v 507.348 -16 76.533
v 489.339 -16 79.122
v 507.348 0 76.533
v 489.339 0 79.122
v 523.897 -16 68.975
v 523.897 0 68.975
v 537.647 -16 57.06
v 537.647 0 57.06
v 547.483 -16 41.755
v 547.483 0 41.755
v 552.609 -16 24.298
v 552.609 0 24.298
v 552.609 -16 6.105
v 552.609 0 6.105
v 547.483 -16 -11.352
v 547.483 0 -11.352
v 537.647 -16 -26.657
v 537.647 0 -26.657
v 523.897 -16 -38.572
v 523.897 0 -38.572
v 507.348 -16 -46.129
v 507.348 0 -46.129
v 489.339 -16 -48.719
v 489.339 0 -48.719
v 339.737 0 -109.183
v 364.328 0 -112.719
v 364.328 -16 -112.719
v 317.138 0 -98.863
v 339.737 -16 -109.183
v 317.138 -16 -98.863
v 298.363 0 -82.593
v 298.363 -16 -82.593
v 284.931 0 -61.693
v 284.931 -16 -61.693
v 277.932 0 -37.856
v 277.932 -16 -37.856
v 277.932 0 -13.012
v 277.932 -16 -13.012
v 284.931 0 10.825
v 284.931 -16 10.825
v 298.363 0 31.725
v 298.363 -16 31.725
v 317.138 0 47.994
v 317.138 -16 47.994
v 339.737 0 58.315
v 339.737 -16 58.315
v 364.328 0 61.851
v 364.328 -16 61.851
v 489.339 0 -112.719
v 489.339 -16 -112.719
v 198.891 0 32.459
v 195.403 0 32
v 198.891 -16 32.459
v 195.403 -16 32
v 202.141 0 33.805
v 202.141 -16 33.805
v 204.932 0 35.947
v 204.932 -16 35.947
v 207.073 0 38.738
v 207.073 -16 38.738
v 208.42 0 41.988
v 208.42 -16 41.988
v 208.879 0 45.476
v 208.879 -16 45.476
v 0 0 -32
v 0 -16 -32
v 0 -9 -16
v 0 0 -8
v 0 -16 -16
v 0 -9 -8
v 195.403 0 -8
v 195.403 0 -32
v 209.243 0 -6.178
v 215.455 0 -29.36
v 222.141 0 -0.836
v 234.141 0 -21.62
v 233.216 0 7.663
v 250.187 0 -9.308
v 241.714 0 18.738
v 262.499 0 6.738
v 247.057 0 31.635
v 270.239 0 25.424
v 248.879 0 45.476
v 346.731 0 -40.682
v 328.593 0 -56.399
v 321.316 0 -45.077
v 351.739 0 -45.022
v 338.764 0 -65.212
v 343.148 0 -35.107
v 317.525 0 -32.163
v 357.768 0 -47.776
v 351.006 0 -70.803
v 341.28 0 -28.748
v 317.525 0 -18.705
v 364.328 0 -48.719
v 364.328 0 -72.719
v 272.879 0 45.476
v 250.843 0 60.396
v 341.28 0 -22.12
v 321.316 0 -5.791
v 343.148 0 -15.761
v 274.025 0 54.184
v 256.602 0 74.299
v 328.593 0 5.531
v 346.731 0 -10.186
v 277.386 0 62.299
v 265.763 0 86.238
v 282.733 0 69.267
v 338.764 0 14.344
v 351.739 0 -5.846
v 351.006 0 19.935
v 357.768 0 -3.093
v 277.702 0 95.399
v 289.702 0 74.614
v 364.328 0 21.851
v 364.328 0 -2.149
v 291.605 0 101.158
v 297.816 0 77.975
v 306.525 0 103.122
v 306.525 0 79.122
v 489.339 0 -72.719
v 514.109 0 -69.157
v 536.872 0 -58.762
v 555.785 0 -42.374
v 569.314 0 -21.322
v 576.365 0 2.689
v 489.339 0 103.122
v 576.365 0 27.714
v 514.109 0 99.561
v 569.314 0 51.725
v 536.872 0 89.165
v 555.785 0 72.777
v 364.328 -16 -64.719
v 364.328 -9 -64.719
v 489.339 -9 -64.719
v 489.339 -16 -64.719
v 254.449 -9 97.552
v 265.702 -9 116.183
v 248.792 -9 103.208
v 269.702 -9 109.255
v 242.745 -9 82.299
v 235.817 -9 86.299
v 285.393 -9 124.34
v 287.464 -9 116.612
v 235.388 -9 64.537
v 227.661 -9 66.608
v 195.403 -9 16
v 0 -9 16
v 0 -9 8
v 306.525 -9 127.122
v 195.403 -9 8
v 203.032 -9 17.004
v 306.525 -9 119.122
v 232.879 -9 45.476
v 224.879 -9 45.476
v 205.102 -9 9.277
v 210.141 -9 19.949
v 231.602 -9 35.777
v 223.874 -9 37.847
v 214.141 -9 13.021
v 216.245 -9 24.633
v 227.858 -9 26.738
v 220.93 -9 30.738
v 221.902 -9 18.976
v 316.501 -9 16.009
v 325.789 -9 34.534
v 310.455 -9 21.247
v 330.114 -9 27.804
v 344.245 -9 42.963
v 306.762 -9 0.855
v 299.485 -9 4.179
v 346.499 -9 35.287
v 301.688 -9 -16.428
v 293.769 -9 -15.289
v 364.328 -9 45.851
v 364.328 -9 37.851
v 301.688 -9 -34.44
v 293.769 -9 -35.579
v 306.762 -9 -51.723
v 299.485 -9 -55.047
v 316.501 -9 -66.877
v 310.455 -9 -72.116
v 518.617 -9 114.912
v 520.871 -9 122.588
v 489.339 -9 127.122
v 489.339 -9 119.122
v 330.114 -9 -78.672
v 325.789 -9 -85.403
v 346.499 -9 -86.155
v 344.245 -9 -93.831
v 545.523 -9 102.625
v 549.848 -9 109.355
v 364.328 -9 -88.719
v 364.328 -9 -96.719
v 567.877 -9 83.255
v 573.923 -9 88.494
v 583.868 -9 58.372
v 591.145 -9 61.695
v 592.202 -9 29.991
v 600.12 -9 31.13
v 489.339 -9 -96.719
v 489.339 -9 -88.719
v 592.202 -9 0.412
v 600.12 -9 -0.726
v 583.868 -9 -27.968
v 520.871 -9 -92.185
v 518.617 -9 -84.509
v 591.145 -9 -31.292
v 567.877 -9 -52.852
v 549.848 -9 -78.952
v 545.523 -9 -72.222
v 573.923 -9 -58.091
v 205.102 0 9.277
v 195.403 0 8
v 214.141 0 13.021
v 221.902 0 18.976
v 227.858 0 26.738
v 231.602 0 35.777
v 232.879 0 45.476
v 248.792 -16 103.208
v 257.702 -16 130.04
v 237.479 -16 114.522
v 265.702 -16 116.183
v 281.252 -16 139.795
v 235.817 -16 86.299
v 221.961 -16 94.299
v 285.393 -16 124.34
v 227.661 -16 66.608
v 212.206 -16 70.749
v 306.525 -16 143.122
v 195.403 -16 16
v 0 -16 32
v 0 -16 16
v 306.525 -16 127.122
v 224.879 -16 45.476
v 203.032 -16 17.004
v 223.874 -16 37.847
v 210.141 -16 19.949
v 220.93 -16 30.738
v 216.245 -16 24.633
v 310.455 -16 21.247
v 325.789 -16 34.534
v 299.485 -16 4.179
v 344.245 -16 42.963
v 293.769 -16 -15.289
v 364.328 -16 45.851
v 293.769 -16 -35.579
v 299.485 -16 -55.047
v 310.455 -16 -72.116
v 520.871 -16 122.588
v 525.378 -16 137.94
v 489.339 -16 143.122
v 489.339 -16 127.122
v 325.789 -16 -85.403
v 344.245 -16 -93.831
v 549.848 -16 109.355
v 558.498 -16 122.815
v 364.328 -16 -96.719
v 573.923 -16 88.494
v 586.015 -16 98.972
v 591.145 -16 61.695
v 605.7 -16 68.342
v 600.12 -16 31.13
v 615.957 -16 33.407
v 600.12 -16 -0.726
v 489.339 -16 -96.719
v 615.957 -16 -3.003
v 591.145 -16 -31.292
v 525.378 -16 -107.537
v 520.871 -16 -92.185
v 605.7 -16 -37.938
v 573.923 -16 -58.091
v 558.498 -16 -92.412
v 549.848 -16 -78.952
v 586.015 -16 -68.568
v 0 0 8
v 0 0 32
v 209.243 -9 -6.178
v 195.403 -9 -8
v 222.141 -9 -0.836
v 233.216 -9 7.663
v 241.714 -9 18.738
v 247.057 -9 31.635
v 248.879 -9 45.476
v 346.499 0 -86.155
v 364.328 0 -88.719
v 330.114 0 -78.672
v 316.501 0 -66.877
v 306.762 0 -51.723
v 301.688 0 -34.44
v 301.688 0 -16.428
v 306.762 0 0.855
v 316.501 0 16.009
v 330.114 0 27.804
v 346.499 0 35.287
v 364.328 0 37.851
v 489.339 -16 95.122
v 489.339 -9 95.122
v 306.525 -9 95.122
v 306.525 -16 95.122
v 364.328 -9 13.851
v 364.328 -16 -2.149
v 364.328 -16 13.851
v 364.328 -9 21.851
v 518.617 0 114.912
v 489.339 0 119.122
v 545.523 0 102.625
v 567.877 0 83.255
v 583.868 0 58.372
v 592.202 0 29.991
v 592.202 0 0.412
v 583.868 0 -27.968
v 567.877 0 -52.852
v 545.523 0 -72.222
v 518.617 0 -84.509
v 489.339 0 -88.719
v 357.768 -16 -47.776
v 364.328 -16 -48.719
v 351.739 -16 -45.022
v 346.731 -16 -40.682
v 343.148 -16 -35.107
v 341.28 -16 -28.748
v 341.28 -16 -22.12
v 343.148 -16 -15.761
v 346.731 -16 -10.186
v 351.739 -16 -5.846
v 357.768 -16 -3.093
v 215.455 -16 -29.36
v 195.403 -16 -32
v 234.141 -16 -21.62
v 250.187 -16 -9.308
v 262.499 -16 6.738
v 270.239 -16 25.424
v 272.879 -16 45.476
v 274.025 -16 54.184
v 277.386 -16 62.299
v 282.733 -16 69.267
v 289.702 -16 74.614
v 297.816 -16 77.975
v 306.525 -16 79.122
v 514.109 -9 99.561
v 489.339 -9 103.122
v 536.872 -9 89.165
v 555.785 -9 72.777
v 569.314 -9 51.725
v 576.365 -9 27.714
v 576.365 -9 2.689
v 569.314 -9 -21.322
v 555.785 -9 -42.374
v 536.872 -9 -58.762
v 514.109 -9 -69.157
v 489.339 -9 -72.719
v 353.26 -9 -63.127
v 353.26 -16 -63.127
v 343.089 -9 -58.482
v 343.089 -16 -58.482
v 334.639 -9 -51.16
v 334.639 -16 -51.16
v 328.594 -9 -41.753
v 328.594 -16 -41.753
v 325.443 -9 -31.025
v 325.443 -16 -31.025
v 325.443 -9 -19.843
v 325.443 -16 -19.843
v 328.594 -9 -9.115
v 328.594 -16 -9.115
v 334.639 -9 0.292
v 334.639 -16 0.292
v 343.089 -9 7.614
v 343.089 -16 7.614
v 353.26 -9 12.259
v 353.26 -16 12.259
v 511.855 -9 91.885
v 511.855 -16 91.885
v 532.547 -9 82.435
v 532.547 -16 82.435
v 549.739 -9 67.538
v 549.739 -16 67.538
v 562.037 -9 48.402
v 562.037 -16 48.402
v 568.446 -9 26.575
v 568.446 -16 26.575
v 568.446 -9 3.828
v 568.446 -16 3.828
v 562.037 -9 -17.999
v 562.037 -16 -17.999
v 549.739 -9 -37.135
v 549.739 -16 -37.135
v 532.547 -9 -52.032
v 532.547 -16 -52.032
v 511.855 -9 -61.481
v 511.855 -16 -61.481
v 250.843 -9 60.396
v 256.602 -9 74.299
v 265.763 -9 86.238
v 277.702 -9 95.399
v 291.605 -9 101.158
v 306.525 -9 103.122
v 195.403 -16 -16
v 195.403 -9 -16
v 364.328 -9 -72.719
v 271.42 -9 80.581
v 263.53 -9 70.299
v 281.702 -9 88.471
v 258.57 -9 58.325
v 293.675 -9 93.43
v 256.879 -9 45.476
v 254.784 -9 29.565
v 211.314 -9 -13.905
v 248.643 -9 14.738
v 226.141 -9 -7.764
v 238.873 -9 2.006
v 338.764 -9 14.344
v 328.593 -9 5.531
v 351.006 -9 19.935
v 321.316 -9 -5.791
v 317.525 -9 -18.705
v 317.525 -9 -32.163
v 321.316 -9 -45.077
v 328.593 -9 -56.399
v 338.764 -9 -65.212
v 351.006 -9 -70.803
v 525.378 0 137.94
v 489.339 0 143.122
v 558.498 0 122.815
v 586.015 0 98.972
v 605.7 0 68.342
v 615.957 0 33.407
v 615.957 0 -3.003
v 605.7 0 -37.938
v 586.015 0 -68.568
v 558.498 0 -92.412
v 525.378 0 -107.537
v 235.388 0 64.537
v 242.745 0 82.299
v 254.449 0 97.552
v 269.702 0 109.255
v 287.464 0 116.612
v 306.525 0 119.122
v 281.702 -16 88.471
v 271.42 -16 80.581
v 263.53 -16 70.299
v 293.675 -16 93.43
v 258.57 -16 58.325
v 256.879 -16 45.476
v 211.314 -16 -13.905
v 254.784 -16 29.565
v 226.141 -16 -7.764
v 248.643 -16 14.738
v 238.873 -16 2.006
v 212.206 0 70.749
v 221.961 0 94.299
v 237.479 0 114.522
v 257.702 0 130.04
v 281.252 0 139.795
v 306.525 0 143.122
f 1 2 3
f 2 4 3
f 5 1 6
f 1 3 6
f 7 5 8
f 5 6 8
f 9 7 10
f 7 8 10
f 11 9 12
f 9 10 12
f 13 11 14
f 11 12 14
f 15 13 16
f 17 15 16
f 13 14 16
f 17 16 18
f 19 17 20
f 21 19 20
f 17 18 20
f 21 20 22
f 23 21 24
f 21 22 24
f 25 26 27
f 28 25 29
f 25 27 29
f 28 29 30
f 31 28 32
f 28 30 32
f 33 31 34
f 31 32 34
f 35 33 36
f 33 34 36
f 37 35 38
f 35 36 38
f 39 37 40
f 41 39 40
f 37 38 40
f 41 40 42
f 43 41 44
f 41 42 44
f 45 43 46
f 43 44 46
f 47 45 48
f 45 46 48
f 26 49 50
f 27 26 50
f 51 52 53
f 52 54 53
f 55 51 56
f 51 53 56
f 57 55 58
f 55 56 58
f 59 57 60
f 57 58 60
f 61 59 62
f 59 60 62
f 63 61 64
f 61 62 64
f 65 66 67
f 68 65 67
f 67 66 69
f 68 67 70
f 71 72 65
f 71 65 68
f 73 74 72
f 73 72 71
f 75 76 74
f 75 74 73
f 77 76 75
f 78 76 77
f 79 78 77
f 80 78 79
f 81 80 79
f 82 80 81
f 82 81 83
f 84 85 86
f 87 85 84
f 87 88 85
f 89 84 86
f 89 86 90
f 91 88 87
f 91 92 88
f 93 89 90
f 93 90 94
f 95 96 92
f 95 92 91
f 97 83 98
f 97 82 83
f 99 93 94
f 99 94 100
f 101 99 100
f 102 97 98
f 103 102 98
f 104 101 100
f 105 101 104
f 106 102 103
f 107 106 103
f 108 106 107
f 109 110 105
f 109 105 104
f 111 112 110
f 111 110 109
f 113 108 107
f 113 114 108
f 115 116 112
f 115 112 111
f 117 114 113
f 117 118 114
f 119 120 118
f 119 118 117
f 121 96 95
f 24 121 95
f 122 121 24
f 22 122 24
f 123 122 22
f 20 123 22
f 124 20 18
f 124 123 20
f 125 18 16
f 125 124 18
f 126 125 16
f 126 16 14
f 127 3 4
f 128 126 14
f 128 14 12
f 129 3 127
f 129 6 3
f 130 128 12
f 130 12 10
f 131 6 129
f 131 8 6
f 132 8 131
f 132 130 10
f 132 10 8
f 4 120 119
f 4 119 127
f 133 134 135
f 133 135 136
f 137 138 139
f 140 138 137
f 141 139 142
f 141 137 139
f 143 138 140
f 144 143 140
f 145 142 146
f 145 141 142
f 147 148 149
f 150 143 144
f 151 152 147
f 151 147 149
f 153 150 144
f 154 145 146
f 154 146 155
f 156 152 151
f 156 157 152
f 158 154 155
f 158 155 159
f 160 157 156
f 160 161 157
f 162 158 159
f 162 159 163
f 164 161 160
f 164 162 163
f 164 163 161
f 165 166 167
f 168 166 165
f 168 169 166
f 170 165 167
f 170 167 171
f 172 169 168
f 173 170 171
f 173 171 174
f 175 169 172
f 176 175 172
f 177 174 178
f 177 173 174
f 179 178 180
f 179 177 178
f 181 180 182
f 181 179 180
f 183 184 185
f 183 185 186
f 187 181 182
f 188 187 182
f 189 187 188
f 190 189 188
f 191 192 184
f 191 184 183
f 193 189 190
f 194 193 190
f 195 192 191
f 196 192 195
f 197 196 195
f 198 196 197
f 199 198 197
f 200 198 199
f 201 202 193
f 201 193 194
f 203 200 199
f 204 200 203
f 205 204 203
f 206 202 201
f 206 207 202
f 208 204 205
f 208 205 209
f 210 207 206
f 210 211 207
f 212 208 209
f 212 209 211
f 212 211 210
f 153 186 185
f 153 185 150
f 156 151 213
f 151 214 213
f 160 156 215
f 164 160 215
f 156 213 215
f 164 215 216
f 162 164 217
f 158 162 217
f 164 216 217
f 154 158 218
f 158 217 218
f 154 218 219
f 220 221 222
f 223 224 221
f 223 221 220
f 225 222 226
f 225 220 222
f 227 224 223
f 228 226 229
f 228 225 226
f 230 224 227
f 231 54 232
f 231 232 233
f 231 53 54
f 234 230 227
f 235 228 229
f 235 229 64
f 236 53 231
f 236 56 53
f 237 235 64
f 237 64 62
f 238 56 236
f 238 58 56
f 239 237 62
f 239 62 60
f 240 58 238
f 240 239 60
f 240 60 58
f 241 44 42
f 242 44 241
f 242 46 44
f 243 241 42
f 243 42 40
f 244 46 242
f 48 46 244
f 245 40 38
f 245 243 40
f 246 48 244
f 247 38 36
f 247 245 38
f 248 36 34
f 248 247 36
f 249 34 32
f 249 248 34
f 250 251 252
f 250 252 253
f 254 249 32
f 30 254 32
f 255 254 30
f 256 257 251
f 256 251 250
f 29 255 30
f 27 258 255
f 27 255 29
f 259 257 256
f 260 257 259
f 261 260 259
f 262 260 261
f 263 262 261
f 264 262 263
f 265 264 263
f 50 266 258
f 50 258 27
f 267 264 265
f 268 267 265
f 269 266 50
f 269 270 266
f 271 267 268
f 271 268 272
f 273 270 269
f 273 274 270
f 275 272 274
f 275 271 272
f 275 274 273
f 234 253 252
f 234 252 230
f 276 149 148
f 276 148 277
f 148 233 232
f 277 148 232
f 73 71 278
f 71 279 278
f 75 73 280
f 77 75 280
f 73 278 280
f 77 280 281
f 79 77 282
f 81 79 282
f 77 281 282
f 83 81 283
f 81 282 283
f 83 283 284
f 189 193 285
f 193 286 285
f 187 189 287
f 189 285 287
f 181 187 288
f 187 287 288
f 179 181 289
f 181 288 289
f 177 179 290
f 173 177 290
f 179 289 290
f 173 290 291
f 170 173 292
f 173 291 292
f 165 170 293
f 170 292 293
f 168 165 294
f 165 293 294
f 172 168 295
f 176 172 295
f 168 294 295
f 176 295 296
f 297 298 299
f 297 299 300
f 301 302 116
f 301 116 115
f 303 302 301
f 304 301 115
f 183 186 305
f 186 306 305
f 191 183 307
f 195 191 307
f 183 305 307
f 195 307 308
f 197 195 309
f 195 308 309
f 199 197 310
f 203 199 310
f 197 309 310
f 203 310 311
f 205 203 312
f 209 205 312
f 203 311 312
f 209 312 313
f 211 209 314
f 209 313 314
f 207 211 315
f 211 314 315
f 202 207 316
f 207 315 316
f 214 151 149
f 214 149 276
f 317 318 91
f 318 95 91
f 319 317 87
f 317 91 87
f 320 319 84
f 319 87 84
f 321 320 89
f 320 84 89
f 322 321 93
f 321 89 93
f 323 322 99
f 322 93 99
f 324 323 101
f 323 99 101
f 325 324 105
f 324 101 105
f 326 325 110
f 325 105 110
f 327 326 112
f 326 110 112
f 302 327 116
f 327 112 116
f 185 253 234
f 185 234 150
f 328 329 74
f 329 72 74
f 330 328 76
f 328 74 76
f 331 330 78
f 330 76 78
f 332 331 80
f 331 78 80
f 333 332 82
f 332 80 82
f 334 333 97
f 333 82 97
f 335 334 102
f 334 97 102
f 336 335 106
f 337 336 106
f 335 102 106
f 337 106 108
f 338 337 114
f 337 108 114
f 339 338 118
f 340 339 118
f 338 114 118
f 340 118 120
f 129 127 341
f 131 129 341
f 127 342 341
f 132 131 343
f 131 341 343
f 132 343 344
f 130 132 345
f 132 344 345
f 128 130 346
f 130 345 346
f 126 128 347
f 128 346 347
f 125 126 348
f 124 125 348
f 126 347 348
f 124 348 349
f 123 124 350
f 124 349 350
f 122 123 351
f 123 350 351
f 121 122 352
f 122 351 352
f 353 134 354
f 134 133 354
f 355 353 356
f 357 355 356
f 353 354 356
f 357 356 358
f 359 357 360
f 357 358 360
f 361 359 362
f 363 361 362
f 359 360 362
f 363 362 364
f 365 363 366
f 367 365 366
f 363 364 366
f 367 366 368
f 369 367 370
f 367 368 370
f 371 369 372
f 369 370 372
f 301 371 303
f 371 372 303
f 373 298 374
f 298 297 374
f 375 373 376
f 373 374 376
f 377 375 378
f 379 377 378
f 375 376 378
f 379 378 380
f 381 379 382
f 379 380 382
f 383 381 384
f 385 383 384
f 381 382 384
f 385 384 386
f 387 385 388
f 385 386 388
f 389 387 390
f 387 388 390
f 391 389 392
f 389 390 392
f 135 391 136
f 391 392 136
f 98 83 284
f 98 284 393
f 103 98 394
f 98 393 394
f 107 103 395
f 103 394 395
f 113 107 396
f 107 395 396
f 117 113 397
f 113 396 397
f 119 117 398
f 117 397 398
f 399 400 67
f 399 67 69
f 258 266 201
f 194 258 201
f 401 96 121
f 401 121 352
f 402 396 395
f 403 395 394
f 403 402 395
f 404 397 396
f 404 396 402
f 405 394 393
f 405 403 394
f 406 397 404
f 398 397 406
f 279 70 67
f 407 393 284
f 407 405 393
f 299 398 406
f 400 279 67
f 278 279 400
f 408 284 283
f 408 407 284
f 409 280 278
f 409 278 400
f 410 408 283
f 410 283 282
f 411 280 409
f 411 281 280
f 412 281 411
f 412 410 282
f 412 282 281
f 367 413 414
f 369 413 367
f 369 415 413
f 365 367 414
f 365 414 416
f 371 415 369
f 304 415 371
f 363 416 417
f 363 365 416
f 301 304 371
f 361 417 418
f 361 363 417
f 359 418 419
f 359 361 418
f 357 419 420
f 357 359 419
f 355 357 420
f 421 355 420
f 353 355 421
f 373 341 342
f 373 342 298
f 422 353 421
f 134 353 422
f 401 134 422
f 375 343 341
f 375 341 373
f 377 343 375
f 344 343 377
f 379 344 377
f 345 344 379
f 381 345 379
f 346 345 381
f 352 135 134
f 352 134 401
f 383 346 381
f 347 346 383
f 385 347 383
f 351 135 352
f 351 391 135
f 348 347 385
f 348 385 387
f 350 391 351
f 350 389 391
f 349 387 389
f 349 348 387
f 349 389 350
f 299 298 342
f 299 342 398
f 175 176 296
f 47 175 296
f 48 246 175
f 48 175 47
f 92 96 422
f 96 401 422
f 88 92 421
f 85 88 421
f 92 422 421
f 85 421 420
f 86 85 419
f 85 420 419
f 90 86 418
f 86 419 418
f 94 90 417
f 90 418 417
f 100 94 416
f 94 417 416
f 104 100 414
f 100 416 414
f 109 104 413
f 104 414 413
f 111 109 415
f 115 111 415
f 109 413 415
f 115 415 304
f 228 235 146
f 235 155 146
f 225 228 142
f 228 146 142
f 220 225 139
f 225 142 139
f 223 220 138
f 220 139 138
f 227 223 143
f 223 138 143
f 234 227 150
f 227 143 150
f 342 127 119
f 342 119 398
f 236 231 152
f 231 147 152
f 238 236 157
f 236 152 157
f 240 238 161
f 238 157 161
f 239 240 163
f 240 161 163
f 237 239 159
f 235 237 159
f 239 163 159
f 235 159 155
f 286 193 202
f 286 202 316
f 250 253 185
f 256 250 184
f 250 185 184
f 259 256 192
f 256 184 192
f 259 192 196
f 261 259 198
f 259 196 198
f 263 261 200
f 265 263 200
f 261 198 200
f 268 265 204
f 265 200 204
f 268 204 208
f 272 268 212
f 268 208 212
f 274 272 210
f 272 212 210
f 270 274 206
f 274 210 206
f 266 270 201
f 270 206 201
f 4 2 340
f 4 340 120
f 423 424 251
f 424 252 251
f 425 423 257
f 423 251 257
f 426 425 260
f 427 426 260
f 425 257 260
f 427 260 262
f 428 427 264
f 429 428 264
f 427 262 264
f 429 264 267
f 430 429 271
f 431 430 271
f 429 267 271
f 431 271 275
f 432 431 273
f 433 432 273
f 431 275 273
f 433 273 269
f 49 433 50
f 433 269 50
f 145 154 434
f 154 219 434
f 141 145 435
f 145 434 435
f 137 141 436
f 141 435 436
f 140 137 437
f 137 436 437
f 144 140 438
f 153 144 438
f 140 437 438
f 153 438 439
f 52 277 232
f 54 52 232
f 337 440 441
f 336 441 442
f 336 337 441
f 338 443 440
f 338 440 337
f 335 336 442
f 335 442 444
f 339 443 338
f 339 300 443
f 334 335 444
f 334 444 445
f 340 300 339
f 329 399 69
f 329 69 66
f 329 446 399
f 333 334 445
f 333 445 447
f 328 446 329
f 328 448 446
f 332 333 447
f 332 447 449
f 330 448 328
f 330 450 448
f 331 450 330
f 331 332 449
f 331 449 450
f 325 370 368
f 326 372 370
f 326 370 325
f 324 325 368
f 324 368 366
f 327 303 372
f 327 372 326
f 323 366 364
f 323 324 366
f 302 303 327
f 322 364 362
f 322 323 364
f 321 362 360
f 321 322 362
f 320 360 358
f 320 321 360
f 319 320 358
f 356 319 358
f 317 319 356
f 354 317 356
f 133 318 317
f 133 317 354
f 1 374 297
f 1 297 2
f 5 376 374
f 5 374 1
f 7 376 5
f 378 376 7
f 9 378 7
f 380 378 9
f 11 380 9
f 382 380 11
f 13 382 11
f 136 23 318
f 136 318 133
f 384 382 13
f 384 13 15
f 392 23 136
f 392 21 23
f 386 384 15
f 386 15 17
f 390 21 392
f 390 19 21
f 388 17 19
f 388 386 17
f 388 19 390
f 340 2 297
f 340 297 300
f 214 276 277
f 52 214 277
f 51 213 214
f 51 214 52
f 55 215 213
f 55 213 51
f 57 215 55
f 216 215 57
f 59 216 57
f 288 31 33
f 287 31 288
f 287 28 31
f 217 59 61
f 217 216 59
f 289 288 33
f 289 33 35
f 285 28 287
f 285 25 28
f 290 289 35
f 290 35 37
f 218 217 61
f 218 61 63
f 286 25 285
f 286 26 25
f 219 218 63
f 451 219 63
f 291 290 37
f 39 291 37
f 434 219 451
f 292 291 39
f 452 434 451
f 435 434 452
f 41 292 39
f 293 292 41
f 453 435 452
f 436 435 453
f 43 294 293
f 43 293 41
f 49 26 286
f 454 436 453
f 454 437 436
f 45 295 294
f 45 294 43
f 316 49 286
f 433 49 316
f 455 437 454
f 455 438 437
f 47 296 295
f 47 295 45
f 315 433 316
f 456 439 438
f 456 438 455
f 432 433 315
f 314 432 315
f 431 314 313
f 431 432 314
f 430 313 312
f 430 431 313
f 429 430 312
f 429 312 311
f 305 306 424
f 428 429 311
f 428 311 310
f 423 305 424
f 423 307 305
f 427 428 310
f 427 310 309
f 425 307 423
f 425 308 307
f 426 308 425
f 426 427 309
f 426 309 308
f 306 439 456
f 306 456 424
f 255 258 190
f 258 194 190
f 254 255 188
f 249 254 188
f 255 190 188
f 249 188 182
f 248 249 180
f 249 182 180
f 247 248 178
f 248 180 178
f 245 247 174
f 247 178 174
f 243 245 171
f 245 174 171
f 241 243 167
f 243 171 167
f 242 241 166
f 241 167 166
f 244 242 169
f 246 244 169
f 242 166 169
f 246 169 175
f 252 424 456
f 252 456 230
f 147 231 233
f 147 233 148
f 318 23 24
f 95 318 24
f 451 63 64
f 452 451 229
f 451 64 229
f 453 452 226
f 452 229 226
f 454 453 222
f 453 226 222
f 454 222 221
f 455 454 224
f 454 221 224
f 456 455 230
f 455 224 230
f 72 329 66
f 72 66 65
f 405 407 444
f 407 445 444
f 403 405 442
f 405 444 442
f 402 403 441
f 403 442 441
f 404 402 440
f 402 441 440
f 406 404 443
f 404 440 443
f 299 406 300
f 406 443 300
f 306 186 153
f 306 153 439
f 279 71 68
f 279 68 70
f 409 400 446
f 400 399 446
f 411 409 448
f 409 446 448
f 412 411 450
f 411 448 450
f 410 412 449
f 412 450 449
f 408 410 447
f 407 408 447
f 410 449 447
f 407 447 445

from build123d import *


with BuildPart() as part:
    # Sweep1: sweep along a path in Sketch3
    with BuildLine(Plane(origin=(0, 0, 0), x_dir=(1, 0, 0), z_dir=(0, 1, 0))) as sweep1_path:
        Line((0, 0), (195.402745666, 0))
        ThreePointArc((195.402745666, 0), (227.559166384, -13.319625579), (240.878791962, -45.476046296))
        ThreePointArc((240.878791962, -45.476046296), (260.106014504, -91.894667724), (306.524635932, -111.121890266))
        Line((306.524635932, -111.121890266), (489.339173348, -111.121890266))
        ThreePointArc((489.339173348, -111.121890266), (585.259476302, -15.201587312), (489.339173348, 80.718715642))
        Line((489.339173348, 80.718715642), (364.328124734, 80.718715642))
        ThreePointArc((364.328124734, 80.718715642), (309.043455221, 25.434046129), (364.328124734, -29.850623385))
    # Sketch1 → Sweep1 (sweep)
    with BuildSketch(Plane(origin=(0, 0, 0), x_dir=(0, 0, -1), z_dir=(1, 0, 0))):
        Polygon((16, -16), (32, -16), (32, 0), (8, 0), (8, -9), (16, -9), align=None)
        Polygon((-32, -16), (-16, -16), (-16, -9), (-8, -9), (-8, 0), (-32, 0), align=None)
    sweep(path=sweep1_path.line)


solid = part.part
